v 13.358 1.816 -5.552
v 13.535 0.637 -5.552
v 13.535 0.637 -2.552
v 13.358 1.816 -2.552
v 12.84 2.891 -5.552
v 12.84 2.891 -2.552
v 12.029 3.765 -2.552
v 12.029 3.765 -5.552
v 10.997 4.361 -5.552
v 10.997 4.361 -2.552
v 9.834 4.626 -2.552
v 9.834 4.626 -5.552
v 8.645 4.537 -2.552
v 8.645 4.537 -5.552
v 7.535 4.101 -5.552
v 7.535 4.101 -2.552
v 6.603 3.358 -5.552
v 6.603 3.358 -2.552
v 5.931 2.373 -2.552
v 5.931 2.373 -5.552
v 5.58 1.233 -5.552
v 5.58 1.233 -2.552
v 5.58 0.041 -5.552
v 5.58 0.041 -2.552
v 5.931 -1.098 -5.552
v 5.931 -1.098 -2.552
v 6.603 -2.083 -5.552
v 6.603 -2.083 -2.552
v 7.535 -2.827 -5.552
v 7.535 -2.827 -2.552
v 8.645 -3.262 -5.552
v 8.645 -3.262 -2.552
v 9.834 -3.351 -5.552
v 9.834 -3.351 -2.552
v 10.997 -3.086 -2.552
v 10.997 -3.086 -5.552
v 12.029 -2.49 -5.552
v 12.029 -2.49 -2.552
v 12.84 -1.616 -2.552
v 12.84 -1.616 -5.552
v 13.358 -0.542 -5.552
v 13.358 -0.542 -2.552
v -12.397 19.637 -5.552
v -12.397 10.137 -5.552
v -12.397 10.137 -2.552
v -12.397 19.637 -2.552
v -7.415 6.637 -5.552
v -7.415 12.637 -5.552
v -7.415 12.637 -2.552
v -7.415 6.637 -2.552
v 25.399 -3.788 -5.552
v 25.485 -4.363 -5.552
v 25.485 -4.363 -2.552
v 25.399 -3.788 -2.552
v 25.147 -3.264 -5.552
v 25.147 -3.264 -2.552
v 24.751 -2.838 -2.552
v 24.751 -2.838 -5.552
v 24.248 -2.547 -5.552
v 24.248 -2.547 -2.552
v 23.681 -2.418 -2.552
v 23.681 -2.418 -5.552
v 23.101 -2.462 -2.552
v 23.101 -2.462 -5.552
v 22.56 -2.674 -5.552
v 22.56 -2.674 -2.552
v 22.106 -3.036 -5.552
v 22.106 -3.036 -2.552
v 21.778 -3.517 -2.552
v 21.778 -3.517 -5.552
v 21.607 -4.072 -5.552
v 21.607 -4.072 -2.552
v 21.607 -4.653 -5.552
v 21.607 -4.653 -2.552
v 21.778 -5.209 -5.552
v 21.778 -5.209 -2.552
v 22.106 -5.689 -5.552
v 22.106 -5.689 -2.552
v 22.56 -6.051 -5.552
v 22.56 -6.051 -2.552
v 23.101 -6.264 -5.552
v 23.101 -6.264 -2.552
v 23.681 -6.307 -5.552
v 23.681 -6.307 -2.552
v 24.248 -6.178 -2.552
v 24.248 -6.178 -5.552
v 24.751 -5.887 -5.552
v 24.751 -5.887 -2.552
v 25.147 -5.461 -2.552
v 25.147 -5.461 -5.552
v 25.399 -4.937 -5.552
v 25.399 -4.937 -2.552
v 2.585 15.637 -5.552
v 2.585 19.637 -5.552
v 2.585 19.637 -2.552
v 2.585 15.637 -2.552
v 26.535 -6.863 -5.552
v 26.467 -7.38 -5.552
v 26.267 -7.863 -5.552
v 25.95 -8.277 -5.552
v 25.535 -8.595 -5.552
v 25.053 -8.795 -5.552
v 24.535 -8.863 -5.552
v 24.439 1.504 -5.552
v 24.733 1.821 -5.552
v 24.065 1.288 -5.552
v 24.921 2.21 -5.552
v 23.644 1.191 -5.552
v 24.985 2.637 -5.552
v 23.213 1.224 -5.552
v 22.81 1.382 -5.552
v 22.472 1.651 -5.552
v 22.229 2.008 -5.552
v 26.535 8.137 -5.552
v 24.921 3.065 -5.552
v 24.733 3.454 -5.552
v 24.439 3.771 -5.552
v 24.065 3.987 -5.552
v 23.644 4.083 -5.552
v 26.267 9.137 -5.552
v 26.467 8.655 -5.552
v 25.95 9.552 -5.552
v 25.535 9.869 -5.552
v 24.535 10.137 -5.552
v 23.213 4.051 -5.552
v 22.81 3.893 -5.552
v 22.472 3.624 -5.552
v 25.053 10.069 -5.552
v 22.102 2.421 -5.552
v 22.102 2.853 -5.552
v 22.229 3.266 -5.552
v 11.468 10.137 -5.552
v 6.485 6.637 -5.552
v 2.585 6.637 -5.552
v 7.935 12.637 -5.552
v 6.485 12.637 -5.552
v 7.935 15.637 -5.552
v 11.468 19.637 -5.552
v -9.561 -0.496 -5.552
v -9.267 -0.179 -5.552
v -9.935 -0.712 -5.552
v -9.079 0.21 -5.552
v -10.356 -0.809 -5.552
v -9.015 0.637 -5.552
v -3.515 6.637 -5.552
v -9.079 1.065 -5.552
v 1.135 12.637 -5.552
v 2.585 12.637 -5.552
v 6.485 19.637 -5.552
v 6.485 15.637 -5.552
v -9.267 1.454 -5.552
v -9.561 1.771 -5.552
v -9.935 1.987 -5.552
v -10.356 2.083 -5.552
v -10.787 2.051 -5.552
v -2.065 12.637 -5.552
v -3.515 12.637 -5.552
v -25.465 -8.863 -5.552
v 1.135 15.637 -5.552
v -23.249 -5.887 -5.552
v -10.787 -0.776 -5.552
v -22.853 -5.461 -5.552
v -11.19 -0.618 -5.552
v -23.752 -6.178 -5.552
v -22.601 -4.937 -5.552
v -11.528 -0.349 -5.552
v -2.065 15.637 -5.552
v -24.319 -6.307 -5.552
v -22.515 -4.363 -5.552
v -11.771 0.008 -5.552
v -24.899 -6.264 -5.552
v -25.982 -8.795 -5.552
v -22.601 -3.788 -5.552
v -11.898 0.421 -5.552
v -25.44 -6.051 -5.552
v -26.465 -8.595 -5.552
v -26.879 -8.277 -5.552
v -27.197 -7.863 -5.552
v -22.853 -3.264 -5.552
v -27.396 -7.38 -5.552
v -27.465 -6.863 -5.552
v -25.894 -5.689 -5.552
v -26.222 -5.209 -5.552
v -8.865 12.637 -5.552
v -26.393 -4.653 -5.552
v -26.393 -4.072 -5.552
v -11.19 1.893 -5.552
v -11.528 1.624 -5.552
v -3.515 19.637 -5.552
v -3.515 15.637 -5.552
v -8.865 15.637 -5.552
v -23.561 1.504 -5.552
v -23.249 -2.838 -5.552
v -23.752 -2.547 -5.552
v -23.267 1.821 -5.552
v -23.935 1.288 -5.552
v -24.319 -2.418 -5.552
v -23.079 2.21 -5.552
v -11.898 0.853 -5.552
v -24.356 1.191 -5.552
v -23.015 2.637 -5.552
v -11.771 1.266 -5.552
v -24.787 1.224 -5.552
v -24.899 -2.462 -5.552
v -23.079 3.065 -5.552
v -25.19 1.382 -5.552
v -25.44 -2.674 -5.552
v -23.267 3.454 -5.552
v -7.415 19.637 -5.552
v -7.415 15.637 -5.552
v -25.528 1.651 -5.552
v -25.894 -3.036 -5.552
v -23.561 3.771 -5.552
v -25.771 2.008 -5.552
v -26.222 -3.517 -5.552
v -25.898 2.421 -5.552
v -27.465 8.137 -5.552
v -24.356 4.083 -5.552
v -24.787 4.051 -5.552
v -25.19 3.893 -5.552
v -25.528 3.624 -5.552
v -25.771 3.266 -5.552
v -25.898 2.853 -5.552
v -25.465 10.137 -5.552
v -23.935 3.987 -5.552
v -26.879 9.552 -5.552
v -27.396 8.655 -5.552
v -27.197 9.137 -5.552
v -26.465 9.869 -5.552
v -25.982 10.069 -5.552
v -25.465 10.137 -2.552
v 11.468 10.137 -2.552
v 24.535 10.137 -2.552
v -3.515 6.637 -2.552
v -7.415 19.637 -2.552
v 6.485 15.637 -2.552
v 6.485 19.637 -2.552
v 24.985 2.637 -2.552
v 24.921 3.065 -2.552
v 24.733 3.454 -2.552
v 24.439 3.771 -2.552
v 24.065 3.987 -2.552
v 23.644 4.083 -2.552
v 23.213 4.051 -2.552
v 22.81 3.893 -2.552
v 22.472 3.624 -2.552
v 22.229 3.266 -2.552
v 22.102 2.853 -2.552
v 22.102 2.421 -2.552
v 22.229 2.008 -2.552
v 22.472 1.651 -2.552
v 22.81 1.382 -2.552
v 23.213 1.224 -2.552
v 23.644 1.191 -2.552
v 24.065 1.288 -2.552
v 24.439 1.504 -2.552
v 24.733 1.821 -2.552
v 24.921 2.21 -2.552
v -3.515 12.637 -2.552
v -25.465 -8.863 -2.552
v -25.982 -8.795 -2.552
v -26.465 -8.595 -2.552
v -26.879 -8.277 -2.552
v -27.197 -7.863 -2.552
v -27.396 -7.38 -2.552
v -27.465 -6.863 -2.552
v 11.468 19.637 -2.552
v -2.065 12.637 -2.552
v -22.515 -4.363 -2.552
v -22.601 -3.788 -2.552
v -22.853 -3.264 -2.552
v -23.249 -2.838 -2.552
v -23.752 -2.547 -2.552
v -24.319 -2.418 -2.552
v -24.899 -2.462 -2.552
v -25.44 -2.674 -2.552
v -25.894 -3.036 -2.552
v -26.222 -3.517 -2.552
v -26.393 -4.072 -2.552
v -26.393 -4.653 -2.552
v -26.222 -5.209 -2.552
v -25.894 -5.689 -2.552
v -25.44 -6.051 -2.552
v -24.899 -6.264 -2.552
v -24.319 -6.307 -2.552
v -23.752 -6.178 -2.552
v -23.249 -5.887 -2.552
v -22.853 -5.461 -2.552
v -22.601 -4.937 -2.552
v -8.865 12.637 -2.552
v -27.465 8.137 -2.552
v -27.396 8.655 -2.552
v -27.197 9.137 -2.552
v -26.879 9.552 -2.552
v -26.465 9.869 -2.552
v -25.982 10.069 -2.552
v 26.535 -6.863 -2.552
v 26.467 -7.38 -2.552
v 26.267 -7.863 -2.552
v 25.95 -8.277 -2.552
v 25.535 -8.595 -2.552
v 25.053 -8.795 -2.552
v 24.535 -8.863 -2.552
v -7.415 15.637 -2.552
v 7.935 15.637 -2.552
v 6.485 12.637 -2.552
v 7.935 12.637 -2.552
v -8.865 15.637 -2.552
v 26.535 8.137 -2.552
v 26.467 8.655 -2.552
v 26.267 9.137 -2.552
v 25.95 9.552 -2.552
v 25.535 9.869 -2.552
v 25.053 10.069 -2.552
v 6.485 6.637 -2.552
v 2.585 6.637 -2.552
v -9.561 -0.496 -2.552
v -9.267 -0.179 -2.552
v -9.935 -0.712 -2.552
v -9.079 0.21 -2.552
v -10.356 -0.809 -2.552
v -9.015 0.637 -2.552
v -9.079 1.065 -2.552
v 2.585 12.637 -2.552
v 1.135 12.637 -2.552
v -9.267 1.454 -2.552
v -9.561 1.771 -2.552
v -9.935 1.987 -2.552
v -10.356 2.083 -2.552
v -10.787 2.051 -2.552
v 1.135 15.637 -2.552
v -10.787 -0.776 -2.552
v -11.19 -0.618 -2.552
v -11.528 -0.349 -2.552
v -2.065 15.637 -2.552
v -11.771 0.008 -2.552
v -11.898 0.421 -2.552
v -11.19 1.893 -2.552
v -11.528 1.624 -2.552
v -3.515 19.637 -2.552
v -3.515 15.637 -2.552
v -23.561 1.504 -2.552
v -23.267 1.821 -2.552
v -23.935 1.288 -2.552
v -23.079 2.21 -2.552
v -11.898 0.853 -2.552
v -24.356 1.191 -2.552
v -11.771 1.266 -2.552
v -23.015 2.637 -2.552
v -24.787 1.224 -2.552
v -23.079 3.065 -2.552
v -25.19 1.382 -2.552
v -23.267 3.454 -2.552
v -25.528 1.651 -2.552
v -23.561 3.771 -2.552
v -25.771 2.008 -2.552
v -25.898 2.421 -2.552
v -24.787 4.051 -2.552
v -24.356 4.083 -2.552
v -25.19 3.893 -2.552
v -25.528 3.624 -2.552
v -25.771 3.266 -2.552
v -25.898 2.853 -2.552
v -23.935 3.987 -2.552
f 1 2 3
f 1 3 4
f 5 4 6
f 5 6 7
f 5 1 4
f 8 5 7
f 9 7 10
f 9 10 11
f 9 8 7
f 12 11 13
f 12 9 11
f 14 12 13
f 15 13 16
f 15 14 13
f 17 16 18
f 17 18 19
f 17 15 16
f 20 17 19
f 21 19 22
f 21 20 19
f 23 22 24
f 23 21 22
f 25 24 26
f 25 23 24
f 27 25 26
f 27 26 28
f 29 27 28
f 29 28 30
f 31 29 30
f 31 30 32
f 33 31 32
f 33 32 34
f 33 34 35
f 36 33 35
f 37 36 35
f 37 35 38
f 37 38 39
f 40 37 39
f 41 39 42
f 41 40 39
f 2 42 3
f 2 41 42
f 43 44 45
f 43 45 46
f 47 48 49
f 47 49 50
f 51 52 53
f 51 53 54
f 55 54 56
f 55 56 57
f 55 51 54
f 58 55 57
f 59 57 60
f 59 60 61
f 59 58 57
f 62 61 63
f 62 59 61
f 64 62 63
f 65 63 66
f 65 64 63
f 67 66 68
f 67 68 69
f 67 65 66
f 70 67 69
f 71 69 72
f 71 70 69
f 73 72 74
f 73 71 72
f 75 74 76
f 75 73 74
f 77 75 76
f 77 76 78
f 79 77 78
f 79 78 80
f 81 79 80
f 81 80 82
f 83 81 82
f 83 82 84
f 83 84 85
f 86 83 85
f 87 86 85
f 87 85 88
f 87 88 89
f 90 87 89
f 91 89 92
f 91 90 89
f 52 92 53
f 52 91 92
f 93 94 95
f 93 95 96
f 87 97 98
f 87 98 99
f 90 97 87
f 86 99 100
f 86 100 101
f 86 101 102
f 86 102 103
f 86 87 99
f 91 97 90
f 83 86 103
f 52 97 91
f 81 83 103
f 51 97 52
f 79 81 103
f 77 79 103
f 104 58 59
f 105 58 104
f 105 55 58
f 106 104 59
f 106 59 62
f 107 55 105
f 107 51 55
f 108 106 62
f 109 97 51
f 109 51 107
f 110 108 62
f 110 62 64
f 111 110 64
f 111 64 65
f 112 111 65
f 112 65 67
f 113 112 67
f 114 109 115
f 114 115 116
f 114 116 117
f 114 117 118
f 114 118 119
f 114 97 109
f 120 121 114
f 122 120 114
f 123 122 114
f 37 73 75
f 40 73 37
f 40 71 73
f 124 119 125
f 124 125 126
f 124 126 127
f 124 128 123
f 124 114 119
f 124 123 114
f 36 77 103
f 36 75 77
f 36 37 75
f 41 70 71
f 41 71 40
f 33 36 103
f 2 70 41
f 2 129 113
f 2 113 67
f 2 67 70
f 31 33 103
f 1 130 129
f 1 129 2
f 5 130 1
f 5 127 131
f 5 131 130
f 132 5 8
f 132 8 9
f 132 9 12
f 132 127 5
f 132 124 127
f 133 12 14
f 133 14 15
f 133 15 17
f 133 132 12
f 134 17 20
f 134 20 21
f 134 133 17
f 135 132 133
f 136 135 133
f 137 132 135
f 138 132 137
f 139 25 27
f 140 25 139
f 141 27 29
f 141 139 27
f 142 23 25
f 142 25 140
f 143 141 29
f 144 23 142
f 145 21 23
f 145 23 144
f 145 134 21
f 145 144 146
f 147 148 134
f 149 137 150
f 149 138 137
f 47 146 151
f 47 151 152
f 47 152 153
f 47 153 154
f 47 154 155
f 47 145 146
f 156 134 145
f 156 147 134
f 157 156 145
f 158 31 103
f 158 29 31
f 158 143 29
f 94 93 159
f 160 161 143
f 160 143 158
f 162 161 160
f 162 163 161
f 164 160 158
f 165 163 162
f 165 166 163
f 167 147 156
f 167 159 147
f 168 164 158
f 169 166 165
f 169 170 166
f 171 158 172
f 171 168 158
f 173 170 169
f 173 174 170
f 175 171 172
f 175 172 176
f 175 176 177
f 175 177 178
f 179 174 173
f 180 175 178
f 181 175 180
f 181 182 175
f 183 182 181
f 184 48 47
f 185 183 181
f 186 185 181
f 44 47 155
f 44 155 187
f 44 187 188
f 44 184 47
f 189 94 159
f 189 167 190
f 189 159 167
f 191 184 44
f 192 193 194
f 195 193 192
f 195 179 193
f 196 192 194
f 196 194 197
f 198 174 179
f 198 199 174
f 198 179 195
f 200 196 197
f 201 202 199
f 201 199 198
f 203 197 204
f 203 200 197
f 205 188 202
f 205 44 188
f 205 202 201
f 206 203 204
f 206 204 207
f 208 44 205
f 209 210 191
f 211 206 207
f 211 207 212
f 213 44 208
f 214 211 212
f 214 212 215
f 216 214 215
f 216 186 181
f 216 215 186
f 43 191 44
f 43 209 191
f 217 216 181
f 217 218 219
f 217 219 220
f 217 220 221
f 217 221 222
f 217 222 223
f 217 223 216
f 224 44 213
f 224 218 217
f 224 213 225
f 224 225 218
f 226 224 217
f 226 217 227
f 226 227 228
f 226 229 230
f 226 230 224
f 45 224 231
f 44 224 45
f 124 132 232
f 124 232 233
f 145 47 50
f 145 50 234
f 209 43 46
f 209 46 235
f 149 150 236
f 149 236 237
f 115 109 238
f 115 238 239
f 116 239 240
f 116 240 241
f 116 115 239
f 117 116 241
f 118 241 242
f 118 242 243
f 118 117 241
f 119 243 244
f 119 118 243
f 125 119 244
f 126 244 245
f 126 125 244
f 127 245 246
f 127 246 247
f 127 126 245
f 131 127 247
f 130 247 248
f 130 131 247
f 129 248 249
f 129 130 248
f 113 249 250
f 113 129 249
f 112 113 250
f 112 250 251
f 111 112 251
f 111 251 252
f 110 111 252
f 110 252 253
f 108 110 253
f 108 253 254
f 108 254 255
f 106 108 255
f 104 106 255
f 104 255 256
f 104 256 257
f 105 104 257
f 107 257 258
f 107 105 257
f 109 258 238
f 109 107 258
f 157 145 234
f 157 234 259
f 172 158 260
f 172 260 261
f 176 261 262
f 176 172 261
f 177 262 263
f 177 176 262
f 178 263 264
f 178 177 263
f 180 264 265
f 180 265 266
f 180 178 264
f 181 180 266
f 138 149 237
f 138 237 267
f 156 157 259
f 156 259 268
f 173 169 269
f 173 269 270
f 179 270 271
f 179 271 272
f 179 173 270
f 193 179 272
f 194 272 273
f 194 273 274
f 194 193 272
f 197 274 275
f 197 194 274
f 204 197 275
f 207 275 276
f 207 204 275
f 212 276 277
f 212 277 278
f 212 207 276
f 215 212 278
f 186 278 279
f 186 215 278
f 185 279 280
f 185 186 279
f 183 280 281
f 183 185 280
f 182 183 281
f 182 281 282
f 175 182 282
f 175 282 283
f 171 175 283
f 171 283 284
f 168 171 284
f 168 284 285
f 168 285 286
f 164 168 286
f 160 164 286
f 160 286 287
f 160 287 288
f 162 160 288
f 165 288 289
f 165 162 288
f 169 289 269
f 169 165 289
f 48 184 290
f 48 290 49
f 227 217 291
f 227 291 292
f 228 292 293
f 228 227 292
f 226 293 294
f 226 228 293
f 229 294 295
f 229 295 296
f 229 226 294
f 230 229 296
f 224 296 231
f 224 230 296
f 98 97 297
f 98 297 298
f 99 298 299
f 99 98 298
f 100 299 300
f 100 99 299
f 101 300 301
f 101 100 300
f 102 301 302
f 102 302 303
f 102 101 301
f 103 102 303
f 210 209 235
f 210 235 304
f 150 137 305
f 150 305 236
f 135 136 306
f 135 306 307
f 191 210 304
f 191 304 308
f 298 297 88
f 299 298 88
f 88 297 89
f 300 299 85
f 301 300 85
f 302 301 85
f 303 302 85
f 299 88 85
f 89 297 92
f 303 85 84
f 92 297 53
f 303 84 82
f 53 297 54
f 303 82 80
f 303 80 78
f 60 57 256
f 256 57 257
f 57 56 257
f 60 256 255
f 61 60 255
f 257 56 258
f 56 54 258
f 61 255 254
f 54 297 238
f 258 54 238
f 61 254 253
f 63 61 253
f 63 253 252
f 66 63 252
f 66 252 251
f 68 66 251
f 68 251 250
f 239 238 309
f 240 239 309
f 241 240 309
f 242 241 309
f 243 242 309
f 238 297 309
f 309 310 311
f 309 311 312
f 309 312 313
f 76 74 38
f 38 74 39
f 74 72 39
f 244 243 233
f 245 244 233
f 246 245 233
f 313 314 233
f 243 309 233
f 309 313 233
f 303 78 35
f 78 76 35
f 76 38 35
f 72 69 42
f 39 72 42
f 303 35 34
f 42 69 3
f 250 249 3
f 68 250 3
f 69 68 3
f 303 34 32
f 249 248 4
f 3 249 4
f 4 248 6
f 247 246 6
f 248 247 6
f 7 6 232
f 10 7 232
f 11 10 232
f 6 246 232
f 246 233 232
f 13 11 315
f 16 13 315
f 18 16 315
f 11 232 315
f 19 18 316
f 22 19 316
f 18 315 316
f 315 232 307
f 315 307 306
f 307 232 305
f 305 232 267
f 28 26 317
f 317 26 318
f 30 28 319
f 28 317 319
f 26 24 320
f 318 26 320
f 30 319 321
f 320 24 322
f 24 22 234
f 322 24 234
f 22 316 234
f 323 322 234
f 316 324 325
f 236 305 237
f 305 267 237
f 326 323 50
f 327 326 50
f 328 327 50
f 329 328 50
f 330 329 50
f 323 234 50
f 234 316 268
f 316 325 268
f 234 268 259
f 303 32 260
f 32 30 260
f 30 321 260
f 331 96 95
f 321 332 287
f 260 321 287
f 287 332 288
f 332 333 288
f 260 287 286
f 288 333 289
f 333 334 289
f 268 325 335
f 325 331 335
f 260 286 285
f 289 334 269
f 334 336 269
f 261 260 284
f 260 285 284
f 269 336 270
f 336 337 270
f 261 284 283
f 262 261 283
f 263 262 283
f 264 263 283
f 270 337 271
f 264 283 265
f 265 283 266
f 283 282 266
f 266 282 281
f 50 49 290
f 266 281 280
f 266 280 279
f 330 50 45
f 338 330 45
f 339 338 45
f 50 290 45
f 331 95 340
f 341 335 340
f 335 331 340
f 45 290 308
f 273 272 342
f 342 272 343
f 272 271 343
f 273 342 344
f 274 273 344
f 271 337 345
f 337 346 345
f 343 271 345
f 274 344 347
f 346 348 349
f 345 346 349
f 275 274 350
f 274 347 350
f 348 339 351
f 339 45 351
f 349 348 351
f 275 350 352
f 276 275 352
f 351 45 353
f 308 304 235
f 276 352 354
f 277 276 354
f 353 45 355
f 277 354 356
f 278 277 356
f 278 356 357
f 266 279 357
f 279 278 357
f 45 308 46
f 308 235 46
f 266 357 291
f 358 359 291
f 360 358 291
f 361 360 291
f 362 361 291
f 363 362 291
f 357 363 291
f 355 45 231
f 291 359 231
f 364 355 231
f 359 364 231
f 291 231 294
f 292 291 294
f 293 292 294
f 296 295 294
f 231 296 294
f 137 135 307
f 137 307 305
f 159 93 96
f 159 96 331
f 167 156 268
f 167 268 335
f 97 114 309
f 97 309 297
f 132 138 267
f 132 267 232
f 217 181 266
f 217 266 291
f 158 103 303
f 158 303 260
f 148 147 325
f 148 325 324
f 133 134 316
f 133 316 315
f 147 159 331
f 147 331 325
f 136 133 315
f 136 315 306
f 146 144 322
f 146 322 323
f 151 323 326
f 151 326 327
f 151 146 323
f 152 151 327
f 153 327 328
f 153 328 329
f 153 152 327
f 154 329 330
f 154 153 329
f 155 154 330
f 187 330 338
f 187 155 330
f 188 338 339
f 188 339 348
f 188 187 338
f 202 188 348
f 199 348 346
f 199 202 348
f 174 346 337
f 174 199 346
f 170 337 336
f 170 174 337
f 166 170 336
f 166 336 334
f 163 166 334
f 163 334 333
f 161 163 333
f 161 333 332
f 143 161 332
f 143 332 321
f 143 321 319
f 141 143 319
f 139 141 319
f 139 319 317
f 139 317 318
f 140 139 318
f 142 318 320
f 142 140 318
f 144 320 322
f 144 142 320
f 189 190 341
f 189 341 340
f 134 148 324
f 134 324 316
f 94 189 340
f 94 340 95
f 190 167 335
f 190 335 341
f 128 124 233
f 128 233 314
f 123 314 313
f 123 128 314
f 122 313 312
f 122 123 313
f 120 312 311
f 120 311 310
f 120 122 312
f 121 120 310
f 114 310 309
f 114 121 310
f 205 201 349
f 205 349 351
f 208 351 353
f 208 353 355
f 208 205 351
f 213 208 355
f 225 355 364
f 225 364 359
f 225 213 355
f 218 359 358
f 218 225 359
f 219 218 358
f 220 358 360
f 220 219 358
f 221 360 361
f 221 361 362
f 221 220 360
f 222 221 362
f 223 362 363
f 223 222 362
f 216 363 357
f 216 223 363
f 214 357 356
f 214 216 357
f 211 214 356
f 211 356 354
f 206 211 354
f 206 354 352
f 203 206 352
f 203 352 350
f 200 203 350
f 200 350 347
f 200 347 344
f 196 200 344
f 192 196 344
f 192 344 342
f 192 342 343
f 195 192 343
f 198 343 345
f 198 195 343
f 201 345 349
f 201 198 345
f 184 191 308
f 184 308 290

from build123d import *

# Parameters (mm, degrees)
SKETCH1_R           = 1.95
SKETCH1_R_2         = 4
SKETCH1_R_3         = 1.45
BOSS_EXTRUDE1_DEPTH = 3


with BuildPart() as part:
    # Sketch1 → Boss-Extrude1 (new body)
    with BuildSketch(Plane.XY.offset(-5.551615438)):
        with BuildLine():
            Line((-25.464626351, 10.13731735), (-12.396849296, 10.13731735))
            Line((-12.396849296, 10.13731735), (-12.396849296, 19.63731735))
            Line((-12.396849296, 19.63731735), (-7.414626351, 19.63731735))
            Line((-7.414626351, 19.63731735), (-7.414626351, 15.63731735))
            Line((-7.414626351, 15.63731735), (-8.864626351, 15.63731735))
            Line((-8.864626351, 15.63731735), (-8.864626351, 12.63731735))
            Line((-8.864626351, 12.63731735), (-7.414626351, 12.63731735))
            Line((-7.414626351, 12.63731735), (-7.414626351, 6.63731735))
            Line((-7.414626351, 6.63731735), (-3.514626351, 6.63731735))
            Line((-3.514626351, 6.63731735), (-3.514626351, 12.63731735))
            Line((-3.514626351, 12.63731735), (-2.064626351, 12.63731735))
            Line((-2.064626351, 12.63731735), (-2.064626351, 15.63731735))
            Line((-2.064626351, 15.63731735), (-3.514626351, 15.63731735))
            Line((-3.514626351, 15.63731735), (-3.514626351, 19.63731735))
            Line((-3.514626351, 19.63731735), (2.585373649, 19.63731735))
            Line((2.585373649, 19.63731735), (2.585373649, 15.63731735))
            Line((2.585373649, 15.63731735), (1.135373649, 15.63731735))
            Line((1.135373649, 15.63731735), (1.135373649, 12.63731735))
            Line((1.135373649, 12.63731735), (2.585373649, 12.63731735))
            Line((2.585373649, 12.63731735), (2.585373649, 6.63731735))
            Line((2.585373649, 6.63731735), (6.485373649, 6.63731735))
            Line((6.485373649, 6.63731735), (6.485373649, 12.63731735))
            Line((6.485373649, 12.63731735), (7.935373649, 12.63731735))
            Line((7.935373649, 12.63731735), (7.935373649, 15.63731735))
            Line((7.935373649, 15.63731735), (6.485373649, 15.63731735))
            Line((6.485373649, 15.63731735), (6.485373649, 19.63731735))
            Line((6.485373649, 19.63731735), (11.467596593, 19.63731735))
            Line((11.467596593, 19.63731735), (11.467596593, 10.13731735))
            Line((11.467596593, 10.13731735), (24.535373649, 10.13731735))
            ThreePointArc((24.535373649, 10.13731735), (25.949587211, 9.551530913), (26.535373649, 8.13731735))
            Line((26.535373649, 8.13731735), (26.535373649, -6.86268265))
            ThreePointArc((26.535373649, -6.86268265), (25.949587211, -8.276896212), (24.535373649, -8.86268265))
            Line((24.535373649, -8.86268265), (-10, -8.86268265))
            Line((-10, -8.86268265), (-25.464626351, -8.86268265))
            ThreePointArc((-25.464626351, -8.86268265), (-26.878839913, -8.276896212), (-27.464626351, -6.86268265))
            Line((-27.464626351, -6.86268265), (-27.464626351, 8.13731735))
            ThreePointArc((-27.464626351, 8.13731735), (-26.878839913, 9.551530913), (-25.464626351, 10.13731735))
        make_face()
        with Locations((-24.464626351, -4.36268265)):
            Circle(SKETCH1_R, mode=Mode.SUBTRACT)
        with Locations((23.535373649, -4.36268265)):
            Circle(SKETCH1_R, mode=Mode.SUBTRACT)
        with Locations((9.535373649, 0.63731735)):
            Circle(SKETCH1_R_2, mode=Mode.SUBTRACT)
        with Locations((-10.464626351, 0.63731735)):
            Circle(SKETCH1_R_3, mode=Mode.SUBTRACT)
        with Locations((-24.464626351, 2.63731735)):
            Circle(SKETCH1_R_3, mode=Mode.SUBTRACT)
        with Locations((23.535373649, 2.63731735)):
            Circle(SKETCH1_R_3, mode=Mode.SUBTRACT)
    extrude(amount=BOSS_EXTRUDE1_DEPTH)


solid = part.part
